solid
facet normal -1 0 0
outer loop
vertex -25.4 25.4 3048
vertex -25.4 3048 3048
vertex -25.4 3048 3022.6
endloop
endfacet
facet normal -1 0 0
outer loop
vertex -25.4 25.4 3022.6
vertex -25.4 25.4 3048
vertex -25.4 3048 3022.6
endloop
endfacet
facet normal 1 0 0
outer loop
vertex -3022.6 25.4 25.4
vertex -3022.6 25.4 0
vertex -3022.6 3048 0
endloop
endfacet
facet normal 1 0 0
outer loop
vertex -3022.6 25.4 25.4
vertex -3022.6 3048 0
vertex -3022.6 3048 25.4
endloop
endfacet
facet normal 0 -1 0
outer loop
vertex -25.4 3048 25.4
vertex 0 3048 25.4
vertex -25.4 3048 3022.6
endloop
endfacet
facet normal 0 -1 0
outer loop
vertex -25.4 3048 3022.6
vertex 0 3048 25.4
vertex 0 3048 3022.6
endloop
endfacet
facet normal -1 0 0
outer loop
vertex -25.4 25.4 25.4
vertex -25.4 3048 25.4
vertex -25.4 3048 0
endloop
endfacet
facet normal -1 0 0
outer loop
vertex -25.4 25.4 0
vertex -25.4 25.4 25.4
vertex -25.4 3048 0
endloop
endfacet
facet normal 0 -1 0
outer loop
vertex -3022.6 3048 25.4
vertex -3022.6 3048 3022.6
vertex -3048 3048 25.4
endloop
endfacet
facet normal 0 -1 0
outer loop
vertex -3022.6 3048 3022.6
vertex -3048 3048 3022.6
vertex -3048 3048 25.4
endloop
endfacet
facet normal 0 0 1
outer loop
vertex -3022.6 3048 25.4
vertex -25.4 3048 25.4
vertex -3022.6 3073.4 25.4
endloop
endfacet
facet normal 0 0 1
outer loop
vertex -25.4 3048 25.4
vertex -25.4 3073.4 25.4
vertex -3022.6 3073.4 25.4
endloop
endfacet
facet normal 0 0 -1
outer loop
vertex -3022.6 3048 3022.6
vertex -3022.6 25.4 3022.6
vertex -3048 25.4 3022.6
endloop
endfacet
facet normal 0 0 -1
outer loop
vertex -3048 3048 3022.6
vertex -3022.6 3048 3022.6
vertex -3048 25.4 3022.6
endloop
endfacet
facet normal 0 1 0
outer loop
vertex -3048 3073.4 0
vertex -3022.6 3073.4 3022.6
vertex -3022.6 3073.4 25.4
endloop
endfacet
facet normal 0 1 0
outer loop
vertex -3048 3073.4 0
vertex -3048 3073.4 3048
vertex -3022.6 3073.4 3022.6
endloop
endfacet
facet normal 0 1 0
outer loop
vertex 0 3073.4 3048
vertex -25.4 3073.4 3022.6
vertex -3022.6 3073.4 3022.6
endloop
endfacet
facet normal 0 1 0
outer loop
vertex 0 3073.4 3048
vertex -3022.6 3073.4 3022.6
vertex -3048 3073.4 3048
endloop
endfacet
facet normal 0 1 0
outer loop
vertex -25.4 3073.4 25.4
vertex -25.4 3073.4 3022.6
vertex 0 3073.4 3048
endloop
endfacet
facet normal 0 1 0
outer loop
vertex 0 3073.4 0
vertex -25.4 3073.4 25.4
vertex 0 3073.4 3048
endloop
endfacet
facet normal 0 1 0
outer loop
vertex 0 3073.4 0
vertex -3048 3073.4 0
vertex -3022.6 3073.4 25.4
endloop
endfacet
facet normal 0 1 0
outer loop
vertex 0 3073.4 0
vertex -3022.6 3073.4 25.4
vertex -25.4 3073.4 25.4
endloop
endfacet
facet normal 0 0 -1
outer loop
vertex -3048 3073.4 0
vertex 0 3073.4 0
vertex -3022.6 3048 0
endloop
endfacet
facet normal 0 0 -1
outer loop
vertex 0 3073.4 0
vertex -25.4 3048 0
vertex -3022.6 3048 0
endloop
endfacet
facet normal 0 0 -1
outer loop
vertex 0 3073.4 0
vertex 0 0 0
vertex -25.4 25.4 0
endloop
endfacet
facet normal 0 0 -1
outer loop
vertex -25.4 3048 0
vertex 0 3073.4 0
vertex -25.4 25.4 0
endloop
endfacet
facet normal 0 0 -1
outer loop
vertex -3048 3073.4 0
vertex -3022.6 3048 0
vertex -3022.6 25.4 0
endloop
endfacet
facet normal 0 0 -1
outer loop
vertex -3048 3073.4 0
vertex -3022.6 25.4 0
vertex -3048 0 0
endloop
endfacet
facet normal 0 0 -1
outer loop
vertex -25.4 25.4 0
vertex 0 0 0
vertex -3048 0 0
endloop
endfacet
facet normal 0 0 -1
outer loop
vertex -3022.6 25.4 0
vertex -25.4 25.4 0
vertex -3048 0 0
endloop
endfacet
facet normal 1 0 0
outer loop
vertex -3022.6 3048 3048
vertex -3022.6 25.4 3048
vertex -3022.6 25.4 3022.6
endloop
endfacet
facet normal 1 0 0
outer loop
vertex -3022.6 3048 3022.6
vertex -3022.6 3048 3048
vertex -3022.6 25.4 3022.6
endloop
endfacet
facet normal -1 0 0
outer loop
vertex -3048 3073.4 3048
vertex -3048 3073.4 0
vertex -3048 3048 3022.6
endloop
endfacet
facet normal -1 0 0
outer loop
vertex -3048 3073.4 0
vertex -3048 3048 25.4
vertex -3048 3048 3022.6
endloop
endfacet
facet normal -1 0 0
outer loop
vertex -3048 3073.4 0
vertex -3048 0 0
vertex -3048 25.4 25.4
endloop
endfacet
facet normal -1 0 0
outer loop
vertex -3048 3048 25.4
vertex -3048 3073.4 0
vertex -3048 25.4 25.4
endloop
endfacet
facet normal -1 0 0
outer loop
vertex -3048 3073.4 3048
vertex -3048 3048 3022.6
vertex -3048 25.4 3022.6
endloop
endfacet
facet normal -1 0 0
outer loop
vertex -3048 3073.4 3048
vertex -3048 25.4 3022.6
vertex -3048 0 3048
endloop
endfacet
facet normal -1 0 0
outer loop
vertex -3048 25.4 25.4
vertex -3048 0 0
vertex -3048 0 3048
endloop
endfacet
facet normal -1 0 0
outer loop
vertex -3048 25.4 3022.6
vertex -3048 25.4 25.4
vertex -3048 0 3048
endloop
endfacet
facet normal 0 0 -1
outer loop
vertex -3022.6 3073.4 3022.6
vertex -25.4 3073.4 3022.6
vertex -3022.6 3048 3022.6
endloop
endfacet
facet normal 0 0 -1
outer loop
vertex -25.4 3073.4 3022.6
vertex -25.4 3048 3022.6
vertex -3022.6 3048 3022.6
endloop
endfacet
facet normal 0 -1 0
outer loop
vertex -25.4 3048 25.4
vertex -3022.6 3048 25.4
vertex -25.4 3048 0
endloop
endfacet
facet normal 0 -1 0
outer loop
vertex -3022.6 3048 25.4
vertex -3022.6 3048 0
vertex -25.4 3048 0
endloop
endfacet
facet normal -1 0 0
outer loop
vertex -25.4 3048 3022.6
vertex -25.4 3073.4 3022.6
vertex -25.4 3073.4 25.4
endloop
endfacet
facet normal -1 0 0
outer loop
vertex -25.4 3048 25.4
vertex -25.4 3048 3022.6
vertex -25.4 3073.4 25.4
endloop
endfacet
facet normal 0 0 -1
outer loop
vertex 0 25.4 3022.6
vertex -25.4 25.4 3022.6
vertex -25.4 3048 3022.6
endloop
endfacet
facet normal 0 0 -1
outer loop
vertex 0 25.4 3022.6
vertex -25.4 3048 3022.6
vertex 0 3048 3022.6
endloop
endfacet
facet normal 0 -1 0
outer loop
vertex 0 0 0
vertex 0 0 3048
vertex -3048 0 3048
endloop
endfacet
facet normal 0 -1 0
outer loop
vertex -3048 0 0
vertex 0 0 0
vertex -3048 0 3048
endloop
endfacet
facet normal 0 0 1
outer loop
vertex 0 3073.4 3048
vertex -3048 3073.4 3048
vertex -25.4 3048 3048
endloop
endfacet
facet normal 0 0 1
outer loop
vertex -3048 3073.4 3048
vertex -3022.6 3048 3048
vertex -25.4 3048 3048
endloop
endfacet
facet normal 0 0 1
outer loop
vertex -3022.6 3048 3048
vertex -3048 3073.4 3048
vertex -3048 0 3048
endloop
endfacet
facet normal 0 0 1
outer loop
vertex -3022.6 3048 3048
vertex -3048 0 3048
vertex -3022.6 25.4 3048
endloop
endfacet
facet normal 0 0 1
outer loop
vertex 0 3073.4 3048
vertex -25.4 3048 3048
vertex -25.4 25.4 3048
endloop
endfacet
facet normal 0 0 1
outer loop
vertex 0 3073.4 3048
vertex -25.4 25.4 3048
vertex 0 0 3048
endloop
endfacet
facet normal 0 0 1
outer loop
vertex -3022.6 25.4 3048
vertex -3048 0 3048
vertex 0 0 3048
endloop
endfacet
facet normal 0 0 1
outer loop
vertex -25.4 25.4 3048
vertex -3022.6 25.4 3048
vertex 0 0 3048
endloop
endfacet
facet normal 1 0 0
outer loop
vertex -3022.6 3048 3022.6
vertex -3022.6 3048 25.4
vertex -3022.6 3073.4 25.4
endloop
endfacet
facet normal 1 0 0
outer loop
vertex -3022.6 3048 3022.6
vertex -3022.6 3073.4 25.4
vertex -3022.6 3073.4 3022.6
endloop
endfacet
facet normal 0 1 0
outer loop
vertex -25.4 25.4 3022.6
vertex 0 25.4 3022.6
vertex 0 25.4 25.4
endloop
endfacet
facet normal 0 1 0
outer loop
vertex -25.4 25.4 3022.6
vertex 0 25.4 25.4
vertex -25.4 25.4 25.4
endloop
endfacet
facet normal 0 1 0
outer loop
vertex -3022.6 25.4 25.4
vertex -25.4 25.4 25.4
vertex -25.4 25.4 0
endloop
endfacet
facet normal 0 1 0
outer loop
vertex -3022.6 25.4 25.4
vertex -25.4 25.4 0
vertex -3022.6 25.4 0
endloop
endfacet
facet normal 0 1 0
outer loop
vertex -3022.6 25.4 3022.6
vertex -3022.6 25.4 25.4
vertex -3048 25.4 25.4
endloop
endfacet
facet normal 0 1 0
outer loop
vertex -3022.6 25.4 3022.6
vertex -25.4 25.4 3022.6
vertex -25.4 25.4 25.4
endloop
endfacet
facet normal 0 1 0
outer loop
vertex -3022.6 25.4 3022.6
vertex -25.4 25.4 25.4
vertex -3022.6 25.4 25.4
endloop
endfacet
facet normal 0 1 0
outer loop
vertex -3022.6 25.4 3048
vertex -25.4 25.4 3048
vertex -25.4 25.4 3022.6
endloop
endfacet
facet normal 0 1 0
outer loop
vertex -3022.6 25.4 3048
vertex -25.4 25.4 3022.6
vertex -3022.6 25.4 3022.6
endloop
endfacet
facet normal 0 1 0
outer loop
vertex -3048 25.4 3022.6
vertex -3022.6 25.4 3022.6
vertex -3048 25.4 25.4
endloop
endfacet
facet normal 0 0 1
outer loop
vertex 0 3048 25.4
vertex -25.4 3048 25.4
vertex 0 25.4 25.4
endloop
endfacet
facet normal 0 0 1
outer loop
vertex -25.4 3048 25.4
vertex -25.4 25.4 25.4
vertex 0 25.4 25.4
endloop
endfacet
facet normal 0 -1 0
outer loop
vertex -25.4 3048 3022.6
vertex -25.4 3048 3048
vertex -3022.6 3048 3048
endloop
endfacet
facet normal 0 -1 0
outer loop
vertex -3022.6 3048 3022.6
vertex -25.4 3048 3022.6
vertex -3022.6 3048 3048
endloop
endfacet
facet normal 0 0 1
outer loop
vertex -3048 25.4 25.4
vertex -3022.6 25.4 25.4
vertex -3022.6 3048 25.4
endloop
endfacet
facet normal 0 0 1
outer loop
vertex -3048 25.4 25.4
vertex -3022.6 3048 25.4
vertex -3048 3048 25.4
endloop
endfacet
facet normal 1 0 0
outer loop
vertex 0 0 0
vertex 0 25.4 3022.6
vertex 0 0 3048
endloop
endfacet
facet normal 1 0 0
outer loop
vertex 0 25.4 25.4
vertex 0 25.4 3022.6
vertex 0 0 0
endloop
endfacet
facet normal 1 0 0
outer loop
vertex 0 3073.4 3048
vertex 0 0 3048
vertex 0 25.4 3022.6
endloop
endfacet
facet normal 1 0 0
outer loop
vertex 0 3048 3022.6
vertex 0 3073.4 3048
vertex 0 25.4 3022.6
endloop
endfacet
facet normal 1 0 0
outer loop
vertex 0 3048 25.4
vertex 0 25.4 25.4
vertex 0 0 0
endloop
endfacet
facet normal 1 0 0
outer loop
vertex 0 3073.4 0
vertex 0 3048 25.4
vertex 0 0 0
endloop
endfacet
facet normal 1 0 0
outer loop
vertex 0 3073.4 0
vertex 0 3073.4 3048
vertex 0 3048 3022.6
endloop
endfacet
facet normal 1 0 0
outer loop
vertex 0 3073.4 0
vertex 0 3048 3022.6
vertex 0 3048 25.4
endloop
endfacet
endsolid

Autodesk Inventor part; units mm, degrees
ref_plane "YZ Plane" through (0, 0, 0) normal (1, 0, 0) x (0, 1, 0)
ref_plane "XZ Plane" through (0, 0, 0) normal (0, 1, 0) x (-1, 0, 0)
ref_plane "XY Plane" through (0, 0, 0) normal (0, 0, 1) x (1, 0, 0)
sketch "Sketch1" plane through (0, 0, 0) normal (0, 1, 0) x (-1, 0, 0)
  line L0 (0, 0) -> (3048, 0)
  line L1 (3048, 0) -> (3048, 3048)
  line L2 (3048, 3048) -> (0, 3048)
  line L3 (0, 3048) -> (0, 0)
  dimension "d0" = 3048
  dimension "d1" = 3048
extrude "Extrusion1" add sketch "Sketch1" along normal blind 25.4
sketch "Sketch2" plane through (0, 25.4, 0) normal (0, 1, 0) x (1, 0, 0)
  line L0 (-3048, 0) -> (-3022.6, 0)
  line L1 (-3022.6, 0) -> (-3022.6, -25.4)
  line L2 (-3022.6, -25.4) -> (-3048, -25.4)
  line L3 (-3048, -25.4) -> (-3048, 0)
  line L4 (0, 0) -> (-25.4, 0)
  line L5 (-25.4, 0) -> (-25.4, -25.4)
  line L6 (-25.4, -25.4) -> (0, -25.4)
  line L7 (0, -25.4) -> (0, 0)
  line L8 (-3048, -3048) -> (-3022.6, -3048)
  line L9 (-3022.6, -3048) -> (-3022.6, -3022.6)
  line L10 (-3022.6, -3022.6) -> (-3048, -3022.6)
  line L11 (-3048, -3022.6) -> (-3048, -3048)
  line L12 (0, -3048) -> (-25.4, -3048)
  line L13 (-25.4, -3048) -> (-25.4, -3022.6)
  line L14 (-25.4, -3022.6) -> (0, -3022.6)
  line L15 (0, -3022.6) -> (0, -3048)
  dimension "d4" = 25.4
  dimension "d5" = 25.4
  dimension "d6" = 25.4
  dimension "d7" = 25.4
  dimension "d8" = 25.4
  dimension "d9" = 25.4
  dimension "d10" = 25.4
  dimension "d11" = 25.4
extrude "Extrusion2" add sketch "Sketch2" along normal blind 3048
sketch "Sketch3" plane through (0, 0, 3048) normal (1, 0, 0) x (0, 0, -1)
  line L0 (3022.6, 25.4) -> (3022.6, 3073.4) projected
  line L1 (0, 3073.4) -> (3022.6, 3073.4)
  line L2 (3022.6, 3073.4) -> (3022.6, 3048)
  line L3 (3022.6, 3048) -> (0, 3048)
  line L4 (0, 3048) -> (0, 3073.4)
  dimension "d14" = 25.4
extrude "Extrusion3" add sketch "Sketch3" against normal blind 25.4
sketch "Sketch4" plane through (-3048, 0, 3048) normal (0, 0, 1) x (1, 0, 0)
  line L0 (0, 3073.4) -> (3048, 3073.4)
  line L1 (3048, 3073.4) -> (3048, 3048)
  line L2 (3048, 3048) -> (0, 3048)
  line L3 (0, 3048) -> (0, 3073.4)
  dimension "d17" = 3048
  dimension "d18" = 25.4
extrude "Extrusion4" add sketch "Sketch4" against normal blind 25.4
sketch "Sketch5" plane through (-3048, 0, 0) normal (-1, 0, 0) x (0, 0, 1)
  line L0 (0, 3073.4) -> (3048, 3073.4)
  line L1 (3048, 3073.4) -> (3048, 3048)
  line L2 (3048, 3048) -> (0, 3048)
  line L3 (0, 3048) -> (0, 3073.4)
  dimension "d21" = 3048
  dimension "d22" = 25.4
extrude "Extrusion5" add sketch "Sketch5" against normal blind 25.4
sketch "Sketch6" plane through (0, 0, 0) normal (0, 0, -1) x (-1, 0, 0)
  line L0 (0, 3073.4) -> (3048, 3073.4)
  line L1 (3048, 3073.4) -> (3048, 3048)
  line L2 (3048, 3048) -> (0, 3048)
  line L3 (0, 3048) -> (0, 3073.4)
  dimension "d25" = 3048
  dimension "d26" = 25.4
extrude "Extrusion6" add sketch "Sketch6" against normal blind 25.4
properties part number "canopy"
